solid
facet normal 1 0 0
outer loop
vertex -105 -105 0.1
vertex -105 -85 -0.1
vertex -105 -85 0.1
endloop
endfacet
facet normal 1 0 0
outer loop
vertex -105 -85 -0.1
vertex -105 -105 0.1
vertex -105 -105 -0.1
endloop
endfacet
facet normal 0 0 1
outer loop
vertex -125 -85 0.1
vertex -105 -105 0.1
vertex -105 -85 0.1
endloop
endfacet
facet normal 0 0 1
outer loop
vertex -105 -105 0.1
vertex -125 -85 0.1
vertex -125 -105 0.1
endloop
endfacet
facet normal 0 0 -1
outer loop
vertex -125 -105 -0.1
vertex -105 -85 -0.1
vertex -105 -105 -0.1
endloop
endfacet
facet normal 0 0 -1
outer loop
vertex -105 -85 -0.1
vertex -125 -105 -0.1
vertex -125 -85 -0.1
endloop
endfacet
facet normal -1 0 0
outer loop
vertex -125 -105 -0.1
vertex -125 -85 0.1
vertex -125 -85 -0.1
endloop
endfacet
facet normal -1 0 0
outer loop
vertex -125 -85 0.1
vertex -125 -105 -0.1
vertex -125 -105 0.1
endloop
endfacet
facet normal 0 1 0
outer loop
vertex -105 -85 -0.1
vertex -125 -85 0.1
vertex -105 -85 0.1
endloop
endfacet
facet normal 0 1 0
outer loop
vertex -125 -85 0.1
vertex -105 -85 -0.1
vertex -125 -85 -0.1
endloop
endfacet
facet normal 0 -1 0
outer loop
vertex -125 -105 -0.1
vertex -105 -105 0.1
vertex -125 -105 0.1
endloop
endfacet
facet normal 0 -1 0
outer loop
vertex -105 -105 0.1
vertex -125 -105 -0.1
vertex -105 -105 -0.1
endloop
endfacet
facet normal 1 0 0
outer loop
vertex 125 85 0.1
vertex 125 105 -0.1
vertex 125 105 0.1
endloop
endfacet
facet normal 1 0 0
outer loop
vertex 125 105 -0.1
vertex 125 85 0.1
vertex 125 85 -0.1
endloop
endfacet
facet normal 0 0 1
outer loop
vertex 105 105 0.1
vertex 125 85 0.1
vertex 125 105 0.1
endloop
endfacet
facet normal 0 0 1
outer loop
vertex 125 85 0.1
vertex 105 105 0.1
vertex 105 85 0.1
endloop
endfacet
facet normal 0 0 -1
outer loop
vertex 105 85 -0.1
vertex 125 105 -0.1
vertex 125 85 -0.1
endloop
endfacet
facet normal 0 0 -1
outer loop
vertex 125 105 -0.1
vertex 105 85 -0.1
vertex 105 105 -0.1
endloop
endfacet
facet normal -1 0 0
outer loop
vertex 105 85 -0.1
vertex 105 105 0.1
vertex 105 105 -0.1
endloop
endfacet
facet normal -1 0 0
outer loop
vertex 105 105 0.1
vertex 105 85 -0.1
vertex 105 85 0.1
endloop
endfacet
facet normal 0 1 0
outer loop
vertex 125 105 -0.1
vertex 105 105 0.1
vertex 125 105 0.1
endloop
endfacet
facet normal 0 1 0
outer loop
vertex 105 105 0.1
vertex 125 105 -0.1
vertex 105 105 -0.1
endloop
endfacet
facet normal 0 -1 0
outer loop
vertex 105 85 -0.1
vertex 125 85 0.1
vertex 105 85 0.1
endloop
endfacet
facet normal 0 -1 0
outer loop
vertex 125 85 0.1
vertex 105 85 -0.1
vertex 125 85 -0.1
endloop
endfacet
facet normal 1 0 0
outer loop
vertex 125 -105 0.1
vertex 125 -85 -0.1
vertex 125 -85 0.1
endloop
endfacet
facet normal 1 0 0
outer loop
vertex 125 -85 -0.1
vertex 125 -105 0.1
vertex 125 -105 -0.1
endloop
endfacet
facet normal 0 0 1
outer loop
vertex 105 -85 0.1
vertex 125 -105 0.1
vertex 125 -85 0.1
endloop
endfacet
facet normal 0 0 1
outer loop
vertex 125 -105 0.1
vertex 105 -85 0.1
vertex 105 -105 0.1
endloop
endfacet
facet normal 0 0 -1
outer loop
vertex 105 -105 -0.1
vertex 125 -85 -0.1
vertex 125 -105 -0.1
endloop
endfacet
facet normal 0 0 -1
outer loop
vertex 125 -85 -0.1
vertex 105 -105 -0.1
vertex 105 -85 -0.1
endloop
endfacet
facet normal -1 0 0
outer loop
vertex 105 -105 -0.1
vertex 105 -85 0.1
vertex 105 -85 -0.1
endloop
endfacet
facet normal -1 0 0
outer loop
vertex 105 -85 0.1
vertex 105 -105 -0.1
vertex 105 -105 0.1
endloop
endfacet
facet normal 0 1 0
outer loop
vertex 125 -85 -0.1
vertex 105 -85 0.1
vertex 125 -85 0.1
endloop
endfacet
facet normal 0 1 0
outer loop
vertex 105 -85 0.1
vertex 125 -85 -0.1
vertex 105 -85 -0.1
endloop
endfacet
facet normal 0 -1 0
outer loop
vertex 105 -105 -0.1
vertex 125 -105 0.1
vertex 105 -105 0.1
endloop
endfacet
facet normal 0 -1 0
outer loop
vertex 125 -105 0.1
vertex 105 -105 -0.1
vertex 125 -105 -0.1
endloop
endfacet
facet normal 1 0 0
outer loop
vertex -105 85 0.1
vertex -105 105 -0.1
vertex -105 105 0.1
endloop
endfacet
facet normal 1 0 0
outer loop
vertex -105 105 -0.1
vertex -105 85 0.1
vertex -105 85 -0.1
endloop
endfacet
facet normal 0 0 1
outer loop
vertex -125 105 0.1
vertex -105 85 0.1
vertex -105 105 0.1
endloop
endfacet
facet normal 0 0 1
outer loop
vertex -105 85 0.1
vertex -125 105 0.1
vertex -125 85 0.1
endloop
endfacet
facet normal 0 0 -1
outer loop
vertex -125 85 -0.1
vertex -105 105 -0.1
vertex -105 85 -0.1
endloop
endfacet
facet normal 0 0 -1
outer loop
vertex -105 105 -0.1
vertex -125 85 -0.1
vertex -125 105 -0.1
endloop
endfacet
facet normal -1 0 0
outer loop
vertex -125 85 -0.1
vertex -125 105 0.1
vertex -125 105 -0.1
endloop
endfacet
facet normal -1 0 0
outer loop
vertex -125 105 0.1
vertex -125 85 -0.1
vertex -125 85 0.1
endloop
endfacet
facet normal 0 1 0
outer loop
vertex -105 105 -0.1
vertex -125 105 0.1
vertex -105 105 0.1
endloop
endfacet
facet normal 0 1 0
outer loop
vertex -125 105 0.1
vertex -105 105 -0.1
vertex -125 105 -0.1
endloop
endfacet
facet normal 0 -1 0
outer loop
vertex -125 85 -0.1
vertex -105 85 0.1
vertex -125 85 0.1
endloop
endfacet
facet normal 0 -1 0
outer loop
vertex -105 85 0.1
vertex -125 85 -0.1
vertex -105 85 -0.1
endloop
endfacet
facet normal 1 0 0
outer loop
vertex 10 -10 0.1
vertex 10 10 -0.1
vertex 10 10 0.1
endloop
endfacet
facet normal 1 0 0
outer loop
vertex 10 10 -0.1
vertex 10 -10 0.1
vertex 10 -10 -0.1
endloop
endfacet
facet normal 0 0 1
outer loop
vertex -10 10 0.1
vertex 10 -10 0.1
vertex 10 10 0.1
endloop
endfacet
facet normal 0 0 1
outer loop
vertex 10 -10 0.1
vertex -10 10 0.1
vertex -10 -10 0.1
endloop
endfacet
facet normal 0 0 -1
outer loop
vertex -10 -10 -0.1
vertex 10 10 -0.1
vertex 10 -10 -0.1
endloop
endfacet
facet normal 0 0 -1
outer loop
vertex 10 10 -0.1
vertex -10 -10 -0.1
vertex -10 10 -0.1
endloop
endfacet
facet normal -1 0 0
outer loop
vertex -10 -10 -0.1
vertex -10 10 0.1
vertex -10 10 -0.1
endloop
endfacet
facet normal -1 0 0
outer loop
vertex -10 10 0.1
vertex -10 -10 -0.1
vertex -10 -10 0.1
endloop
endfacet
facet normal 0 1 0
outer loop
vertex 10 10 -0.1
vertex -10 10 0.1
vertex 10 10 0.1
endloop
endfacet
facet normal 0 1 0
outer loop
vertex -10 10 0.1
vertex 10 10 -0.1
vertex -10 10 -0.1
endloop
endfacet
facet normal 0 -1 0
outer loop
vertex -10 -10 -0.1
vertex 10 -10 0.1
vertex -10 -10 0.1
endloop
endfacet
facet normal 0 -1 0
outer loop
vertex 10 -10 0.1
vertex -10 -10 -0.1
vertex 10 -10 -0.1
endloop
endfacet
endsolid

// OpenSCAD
//first layer calibration print
buildVolumeX=250;
buildVolumeY=210;
buildVolumeZ=210;

calibrationCubeX=20;
calibrationCubeY=20;


layerHeight=.2;

//front left square
translate([calibrationCubeX/2 - buildVolumeX/2 ,calibrationCubeY/2-buildVolumeY/2,0])
cube([calibrationCubeX,calibrationCubeY,layerHeight],center=true);

//rear right square
translate([-calibrationCubeX/2 + buildVolumeX/2 ,-calibrationCubeY/2+buildVolumeY/2,0])
cube([calibrationCubeX,calibrationCubeY,layerHeight],center=true);

//front right square
translate([-calibrationCubeX/2 + buildVolumeX/2 ,calibrationCubeY/2-buildVolumeY/2,0])
cube([calibrationCubeX,calibrationCubeY,layerHeight],center=true);

//rear left square
translate([calibrationCubeX/2 - buildVolumeX/2 ,-calibrationCubeY/2+buildVolumeY/2,0])
cube([calibrationCubeX,calibrationCubeY,layerHeight],center=true);

//center square
cube([calibrationCubeX,calibrationCubeY,layerHeight],center=true);
